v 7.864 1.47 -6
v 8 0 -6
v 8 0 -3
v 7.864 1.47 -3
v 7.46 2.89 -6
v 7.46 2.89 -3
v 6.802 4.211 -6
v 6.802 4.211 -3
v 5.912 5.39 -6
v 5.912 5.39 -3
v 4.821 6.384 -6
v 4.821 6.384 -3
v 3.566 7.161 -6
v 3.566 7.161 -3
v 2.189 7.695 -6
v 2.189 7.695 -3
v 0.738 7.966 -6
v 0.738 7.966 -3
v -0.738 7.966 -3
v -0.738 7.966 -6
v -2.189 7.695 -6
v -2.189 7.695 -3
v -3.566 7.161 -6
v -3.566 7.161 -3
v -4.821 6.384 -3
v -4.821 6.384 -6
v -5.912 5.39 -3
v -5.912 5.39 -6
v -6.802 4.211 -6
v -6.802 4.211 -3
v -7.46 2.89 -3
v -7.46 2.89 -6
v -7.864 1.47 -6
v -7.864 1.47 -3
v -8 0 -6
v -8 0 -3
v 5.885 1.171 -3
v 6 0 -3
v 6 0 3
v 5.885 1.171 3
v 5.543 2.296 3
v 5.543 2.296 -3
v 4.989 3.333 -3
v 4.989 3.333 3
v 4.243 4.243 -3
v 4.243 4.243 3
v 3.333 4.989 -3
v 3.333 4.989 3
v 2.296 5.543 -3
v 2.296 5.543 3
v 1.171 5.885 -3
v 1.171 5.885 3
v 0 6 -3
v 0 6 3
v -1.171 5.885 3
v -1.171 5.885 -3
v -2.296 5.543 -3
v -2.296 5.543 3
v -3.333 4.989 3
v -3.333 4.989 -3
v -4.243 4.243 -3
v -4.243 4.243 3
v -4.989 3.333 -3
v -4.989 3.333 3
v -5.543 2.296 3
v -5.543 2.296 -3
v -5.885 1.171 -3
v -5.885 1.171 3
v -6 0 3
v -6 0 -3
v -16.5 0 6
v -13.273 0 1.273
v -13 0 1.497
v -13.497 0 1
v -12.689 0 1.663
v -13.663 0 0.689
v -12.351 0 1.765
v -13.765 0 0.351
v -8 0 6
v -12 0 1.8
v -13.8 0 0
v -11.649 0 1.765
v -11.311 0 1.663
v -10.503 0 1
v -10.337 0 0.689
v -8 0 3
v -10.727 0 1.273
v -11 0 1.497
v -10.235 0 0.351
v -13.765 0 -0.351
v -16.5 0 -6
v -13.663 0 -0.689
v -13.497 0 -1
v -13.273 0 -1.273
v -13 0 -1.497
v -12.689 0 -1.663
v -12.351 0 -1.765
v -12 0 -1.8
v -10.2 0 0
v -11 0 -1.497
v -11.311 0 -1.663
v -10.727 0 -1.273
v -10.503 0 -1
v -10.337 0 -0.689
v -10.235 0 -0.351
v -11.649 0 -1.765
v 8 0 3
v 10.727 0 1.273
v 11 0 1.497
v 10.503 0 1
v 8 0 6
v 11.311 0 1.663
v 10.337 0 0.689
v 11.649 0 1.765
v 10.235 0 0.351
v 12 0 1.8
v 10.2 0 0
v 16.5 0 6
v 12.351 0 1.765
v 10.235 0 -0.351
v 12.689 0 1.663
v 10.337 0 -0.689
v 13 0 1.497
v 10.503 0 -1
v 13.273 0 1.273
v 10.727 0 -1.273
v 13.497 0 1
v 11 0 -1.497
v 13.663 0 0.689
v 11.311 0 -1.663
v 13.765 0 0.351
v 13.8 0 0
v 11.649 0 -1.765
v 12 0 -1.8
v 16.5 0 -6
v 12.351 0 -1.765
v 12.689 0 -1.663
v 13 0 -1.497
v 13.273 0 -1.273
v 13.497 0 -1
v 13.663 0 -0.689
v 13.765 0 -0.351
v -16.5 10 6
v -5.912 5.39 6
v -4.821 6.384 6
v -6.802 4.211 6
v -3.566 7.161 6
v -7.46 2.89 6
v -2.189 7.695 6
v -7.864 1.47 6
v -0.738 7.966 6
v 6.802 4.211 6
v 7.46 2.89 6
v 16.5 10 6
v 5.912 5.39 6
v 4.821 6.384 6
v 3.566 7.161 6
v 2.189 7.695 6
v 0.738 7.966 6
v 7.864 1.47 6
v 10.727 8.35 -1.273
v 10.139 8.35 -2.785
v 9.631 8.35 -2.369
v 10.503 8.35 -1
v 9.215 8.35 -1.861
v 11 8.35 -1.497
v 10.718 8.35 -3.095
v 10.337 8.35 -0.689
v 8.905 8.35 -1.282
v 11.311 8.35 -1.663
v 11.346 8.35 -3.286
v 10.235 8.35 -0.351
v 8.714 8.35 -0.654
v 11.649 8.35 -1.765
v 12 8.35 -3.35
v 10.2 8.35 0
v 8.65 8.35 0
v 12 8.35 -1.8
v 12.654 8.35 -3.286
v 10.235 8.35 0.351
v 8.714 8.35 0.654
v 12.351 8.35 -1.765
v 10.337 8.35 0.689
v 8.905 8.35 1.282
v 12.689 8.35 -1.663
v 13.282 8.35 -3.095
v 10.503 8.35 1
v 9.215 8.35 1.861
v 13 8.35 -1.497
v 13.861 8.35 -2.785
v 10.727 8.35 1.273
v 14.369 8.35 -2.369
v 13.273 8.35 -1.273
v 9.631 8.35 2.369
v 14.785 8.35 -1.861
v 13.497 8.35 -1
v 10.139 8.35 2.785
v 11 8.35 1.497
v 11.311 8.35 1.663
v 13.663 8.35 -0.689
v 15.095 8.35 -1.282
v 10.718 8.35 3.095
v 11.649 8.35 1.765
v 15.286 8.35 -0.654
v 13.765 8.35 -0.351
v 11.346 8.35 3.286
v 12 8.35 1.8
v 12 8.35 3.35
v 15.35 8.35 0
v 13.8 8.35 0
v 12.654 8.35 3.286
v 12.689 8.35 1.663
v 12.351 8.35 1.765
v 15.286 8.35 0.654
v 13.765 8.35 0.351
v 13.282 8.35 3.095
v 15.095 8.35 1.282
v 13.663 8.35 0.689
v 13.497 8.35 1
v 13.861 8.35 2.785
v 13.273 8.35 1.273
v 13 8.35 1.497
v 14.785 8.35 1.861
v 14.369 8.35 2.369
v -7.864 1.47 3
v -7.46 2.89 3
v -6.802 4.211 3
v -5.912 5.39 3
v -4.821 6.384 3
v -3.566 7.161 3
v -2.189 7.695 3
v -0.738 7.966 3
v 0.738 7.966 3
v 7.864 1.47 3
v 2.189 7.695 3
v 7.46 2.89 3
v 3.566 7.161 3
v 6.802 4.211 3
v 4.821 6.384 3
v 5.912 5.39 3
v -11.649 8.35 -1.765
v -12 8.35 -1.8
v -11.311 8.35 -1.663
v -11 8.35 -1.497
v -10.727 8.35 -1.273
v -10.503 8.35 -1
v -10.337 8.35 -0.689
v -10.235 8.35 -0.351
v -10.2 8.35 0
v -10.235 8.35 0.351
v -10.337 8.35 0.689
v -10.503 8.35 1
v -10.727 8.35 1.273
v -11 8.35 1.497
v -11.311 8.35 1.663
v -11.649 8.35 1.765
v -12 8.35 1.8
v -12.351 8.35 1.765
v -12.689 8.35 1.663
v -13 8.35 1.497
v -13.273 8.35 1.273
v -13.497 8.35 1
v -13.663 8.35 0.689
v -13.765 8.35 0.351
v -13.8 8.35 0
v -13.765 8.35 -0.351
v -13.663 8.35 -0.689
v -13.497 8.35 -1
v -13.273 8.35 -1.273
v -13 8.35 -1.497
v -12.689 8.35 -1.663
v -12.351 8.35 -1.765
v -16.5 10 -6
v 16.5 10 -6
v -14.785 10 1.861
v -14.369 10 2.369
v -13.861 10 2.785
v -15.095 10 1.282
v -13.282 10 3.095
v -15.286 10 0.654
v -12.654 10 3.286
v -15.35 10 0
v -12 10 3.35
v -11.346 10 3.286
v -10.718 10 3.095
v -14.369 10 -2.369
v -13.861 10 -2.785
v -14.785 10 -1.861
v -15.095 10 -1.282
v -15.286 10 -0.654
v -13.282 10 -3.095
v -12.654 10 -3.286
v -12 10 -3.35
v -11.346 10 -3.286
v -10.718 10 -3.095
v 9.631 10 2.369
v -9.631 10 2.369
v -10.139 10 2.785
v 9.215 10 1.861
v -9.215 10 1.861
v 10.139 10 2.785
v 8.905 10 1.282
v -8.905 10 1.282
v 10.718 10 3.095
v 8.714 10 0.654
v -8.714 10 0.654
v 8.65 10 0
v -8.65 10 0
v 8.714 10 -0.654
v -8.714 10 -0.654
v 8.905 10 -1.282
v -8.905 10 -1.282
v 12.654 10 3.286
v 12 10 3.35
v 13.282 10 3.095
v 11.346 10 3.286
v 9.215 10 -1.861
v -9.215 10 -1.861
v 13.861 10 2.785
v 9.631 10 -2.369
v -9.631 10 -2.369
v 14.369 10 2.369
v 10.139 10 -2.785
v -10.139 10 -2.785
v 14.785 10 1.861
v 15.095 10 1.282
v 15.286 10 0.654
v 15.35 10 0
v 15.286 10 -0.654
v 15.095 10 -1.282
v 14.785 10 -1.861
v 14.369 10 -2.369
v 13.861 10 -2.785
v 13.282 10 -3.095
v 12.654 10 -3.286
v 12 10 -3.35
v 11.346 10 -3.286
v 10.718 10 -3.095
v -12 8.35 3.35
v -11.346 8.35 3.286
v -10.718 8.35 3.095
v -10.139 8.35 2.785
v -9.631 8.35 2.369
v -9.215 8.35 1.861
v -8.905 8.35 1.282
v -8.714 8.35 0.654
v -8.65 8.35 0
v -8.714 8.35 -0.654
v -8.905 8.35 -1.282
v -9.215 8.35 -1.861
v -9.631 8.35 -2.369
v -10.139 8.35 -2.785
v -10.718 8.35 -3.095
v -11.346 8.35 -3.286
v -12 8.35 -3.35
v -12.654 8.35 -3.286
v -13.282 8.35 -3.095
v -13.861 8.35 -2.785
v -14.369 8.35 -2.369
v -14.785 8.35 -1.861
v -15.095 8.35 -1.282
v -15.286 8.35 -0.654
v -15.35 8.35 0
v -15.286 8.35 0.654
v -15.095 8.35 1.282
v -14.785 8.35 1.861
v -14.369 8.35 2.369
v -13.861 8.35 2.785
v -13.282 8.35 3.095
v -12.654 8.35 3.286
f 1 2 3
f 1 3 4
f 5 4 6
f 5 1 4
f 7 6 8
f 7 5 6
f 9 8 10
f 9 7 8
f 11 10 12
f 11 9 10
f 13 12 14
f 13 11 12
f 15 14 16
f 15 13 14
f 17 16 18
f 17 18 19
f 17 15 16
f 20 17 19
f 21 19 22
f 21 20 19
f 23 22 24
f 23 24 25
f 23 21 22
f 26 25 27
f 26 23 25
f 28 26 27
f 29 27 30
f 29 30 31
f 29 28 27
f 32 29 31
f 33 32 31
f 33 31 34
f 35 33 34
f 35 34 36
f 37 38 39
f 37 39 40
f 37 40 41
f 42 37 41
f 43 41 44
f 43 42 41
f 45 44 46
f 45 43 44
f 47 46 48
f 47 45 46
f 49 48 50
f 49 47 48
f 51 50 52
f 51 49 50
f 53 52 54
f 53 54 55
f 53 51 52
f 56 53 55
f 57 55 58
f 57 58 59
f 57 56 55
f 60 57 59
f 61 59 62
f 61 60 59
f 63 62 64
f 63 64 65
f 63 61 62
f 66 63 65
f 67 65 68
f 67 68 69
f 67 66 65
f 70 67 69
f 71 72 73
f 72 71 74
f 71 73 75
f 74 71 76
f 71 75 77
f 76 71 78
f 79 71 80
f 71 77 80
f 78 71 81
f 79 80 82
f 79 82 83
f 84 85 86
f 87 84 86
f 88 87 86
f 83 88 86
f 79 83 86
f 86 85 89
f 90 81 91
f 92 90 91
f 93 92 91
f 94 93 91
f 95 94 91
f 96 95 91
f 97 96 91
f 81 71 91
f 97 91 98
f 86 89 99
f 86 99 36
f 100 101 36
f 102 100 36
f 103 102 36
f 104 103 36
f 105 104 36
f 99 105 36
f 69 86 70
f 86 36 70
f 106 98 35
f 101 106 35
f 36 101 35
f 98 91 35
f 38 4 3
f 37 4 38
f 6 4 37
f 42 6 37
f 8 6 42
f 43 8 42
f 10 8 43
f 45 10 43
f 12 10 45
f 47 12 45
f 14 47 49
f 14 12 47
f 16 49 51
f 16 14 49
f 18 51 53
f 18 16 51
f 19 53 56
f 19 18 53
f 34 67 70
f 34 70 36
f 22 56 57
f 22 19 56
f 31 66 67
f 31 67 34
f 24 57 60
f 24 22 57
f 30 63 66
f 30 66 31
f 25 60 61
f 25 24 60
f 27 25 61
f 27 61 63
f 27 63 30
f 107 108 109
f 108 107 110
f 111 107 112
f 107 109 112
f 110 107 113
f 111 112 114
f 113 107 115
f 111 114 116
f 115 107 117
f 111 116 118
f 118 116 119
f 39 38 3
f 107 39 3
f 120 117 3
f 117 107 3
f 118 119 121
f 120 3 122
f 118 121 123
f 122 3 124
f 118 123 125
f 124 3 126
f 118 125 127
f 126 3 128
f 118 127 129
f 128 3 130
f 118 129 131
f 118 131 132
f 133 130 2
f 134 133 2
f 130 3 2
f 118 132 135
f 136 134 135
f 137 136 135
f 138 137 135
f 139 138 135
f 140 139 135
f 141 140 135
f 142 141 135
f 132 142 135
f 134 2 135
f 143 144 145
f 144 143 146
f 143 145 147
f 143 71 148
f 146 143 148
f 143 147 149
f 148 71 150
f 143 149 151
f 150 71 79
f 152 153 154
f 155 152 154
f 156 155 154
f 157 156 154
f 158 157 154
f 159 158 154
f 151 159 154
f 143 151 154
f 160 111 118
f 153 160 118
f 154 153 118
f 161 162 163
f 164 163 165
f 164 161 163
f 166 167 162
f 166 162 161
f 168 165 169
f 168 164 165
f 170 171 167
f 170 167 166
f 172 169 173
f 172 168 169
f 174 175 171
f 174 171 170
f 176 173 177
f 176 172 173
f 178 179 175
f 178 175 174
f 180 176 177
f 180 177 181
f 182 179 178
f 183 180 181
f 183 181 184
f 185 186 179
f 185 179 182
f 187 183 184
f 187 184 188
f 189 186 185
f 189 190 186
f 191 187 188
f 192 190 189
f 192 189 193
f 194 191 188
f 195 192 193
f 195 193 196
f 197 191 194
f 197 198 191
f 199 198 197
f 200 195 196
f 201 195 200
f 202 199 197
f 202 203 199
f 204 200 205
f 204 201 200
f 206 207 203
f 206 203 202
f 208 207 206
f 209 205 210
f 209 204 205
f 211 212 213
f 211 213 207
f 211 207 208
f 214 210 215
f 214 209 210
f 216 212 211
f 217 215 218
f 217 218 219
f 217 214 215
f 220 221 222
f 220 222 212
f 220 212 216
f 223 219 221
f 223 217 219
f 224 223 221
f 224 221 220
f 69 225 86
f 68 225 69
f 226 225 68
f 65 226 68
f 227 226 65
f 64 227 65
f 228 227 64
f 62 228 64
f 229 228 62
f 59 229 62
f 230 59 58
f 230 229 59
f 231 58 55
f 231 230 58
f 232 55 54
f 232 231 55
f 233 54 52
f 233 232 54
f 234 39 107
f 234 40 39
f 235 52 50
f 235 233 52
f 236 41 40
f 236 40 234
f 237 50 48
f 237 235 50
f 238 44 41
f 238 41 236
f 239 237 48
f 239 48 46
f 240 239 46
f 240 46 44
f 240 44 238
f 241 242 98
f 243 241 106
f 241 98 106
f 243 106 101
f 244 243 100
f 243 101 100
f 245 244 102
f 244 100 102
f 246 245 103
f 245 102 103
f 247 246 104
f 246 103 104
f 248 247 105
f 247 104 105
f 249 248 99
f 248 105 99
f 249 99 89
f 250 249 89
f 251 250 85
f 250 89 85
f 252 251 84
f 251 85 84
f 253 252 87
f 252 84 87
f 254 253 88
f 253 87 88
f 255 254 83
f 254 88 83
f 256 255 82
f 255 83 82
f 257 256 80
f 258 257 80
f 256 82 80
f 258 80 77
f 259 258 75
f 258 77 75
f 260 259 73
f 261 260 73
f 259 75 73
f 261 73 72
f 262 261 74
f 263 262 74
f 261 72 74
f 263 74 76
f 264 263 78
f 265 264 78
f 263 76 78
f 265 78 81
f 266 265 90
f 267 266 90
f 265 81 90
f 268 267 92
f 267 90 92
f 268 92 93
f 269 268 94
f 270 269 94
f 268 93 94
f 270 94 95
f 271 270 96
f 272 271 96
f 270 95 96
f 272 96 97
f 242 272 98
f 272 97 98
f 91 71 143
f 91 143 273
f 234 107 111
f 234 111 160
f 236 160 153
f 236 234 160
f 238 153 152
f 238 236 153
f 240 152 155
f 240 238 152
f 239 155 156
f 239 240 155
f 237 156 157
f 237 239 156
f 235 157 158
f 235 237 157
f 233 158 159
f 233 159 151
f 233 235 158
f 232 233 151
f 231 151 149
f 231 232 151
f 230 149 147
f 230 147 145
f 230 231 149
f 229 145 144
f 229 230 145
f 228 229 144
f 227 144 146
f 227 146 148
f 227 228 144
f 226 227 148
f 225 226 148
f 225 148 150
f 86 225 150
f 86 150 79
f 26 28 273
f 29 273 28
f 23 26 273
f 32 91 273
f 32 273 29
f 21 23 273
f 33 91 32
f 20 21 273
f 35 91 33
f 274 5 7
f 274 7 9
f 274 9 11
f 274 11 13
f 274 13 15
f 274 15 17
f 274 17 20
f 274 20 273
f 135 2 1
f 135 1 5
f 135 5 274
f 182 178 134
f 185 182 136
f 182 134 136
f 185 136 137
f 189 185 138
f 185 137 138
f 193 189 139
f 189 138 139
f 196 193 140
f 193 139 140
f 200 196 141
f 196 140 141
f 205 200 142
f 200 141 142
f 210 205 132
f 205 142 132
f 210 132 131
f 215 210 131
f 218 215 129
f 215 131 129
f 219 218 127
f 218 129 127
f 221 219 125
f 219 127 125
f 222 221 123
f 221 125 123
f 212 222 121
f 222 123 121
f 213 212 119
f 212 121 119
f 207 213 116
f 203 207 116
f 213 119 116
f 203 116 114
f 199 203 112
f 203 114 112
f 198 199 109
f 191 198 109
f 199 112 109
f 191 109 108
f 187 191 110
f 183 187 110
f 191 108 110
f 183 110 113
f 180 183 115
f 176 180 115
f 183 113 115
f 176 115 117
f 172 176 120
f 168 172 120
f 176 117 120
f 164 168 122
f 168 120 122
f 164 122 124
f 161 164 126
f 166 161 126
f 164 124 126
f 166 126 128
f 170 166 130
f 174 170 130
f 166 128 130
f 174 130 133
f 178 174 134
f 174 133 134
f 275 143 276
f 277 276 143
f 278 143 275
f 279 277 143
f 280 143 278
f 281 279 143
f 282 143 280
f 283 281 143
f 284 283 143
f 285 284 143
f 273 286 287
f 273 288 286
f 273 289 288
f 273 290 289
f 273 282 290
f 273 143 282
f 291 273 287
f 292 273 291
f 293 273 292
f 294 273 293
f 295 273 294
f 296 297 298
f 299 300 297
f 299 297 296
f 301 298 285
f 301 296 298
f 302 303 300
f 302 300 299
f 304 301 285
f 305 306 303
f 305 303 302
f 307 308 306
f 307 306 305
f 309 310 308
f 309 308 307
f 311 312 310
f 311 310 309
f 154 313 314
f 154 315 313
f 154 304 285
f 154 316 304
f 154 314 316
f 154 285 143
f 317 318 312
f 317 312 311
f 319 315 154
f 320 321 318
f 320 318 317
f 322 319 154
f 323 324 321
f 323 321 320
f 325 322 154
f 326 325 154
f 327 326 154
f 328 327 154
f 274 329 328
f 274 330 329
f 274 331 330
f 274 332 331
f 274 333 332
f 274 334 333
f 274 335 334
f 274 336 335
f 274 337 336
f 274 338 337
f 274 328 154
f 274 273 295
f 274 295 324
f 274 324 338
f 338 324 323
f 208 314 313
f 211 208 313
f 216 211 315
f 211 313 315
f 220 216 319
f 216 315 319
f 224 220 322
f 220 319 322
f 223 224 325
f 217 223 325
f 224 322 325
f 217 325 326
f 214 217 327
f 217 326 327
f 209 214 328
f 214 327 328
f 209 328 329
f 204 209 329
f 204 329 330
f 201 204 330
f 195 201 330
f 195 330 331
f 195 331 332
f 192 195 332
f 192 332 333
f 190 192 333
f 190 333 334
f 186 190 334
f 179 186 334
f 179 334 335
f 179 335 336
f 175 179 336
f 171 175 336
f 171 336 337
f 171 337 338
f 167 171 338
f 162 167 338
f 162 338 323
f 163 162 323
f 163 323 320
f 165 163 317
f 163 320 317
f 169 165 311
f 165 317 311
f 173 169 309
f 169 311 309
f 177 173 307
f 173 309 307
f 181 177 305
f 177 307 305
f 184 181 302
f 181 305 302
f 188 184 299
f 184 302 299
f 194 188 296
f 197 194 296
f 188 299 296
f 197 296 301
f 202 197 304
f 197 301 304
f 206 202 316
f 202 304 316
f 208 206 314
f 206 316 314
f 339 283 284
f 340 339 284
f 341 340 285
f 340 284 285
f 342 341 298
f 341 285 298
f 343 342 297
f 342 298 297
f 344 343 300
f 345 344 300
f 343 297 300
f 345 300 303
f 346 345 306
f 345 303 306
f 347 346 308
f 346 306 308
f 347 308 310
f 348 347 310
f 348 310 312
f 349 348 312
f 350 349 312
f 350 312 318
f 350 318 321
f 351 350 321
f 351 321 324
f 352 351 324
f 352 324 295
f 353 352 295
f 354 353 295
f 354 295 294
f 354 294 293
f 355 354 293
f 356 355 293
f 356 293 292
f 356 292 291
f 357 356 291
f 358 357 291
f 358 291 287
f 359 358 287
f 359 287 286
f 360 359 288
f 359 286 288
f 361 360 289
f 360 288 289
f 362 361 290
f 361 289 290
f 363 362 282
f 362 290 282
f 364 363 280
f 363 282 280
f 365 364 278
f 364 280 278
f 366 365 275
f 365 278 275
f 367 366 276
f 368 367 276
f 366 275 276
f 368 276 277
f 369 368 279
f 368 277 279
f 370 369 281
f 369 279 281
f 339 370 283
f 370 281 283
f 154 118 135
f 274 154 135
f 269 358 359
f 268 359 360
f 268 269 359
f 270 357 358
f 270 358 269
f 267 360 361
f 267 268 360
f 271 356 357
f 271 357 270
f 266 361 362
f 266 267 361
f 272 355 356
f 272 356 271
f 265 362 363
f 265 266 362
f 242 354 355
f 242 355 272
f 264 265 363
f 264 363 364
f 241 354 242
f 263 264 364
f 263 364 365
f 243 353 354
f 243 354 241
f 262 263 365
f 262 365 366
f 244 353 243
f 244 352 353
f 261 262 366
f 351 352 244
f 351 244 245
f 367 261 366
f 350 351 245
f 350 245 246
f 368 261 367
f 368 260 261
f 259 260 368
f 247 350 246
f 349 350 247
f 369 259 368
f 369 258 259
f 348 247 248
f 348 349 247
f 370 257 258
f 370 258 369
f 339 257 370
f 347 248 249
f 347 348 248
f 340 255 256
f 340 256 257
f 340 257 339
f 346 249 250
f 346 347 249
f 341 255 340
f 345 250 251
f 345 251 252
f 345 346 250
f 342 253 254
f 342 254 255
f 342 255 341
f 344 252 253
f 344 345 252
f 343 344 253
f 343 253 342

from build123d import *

# Parameters (mm, degrees)
SKETCH1_W                       = 33
SKETCH1_H                       = 12
BOSS_EXTRUDE1_DEPTH             = 10
CBORE_FOR_M3_SBHCS1_D           = 3.6
CBORE_FOR_M3_SBHCS1_CBORE_D     = 6.7
CBORE_FOR_M3_SBHCS1_CBORE_DEPTH = 1.65


with BuildPart() as part:
    # Sketch1 → Boss-Extrude1 (new body)
    with BuildSketch(Plane(origin=(0, 0, 0), x_dir=(1, 0, 0), z_dir=(0, 1, 0))):
        Rectangle(SKETCH1_W, SKETCH1_H)
    extrude(amount=BOSS_EXTRUDE1_DEPTH)

    # Sketch1<4> → Cut-Revolve1 (revolve, cut)
    with BuildSketch(Plane(origin=(0, 0, 0), x_dir=(1, 0, 0), z_dir=(0, 1, 0))):
        Polygon((0, 6), (-8, 6), (-8, 3), (-6, 3), (-6, -3), (-8, -3), (-8, -6), (0, -6), align=None)
    revolve(axis=Axis((0, 0, -6), (0, 0, 1)), mode=Mode.SUBTRACT)

    # CBORE for M3 SBHCS1 (through all)
    with Locations(Plane(origin=(-12, 10, 0), x_dir=(0, 0, 1), z_dir=(0, 1, 0))):
        with Locations((0, 0), (0, 24)):
            CounterBoreHole(CBORE_FOR_M3_SBHCS1_D / 2, CBORE_FOR_M3_SBHCS1_CBORE_D / 2, CBORE_FOR_M3_SBHCS1_CBORE_DEPTH)


solid = part.part
